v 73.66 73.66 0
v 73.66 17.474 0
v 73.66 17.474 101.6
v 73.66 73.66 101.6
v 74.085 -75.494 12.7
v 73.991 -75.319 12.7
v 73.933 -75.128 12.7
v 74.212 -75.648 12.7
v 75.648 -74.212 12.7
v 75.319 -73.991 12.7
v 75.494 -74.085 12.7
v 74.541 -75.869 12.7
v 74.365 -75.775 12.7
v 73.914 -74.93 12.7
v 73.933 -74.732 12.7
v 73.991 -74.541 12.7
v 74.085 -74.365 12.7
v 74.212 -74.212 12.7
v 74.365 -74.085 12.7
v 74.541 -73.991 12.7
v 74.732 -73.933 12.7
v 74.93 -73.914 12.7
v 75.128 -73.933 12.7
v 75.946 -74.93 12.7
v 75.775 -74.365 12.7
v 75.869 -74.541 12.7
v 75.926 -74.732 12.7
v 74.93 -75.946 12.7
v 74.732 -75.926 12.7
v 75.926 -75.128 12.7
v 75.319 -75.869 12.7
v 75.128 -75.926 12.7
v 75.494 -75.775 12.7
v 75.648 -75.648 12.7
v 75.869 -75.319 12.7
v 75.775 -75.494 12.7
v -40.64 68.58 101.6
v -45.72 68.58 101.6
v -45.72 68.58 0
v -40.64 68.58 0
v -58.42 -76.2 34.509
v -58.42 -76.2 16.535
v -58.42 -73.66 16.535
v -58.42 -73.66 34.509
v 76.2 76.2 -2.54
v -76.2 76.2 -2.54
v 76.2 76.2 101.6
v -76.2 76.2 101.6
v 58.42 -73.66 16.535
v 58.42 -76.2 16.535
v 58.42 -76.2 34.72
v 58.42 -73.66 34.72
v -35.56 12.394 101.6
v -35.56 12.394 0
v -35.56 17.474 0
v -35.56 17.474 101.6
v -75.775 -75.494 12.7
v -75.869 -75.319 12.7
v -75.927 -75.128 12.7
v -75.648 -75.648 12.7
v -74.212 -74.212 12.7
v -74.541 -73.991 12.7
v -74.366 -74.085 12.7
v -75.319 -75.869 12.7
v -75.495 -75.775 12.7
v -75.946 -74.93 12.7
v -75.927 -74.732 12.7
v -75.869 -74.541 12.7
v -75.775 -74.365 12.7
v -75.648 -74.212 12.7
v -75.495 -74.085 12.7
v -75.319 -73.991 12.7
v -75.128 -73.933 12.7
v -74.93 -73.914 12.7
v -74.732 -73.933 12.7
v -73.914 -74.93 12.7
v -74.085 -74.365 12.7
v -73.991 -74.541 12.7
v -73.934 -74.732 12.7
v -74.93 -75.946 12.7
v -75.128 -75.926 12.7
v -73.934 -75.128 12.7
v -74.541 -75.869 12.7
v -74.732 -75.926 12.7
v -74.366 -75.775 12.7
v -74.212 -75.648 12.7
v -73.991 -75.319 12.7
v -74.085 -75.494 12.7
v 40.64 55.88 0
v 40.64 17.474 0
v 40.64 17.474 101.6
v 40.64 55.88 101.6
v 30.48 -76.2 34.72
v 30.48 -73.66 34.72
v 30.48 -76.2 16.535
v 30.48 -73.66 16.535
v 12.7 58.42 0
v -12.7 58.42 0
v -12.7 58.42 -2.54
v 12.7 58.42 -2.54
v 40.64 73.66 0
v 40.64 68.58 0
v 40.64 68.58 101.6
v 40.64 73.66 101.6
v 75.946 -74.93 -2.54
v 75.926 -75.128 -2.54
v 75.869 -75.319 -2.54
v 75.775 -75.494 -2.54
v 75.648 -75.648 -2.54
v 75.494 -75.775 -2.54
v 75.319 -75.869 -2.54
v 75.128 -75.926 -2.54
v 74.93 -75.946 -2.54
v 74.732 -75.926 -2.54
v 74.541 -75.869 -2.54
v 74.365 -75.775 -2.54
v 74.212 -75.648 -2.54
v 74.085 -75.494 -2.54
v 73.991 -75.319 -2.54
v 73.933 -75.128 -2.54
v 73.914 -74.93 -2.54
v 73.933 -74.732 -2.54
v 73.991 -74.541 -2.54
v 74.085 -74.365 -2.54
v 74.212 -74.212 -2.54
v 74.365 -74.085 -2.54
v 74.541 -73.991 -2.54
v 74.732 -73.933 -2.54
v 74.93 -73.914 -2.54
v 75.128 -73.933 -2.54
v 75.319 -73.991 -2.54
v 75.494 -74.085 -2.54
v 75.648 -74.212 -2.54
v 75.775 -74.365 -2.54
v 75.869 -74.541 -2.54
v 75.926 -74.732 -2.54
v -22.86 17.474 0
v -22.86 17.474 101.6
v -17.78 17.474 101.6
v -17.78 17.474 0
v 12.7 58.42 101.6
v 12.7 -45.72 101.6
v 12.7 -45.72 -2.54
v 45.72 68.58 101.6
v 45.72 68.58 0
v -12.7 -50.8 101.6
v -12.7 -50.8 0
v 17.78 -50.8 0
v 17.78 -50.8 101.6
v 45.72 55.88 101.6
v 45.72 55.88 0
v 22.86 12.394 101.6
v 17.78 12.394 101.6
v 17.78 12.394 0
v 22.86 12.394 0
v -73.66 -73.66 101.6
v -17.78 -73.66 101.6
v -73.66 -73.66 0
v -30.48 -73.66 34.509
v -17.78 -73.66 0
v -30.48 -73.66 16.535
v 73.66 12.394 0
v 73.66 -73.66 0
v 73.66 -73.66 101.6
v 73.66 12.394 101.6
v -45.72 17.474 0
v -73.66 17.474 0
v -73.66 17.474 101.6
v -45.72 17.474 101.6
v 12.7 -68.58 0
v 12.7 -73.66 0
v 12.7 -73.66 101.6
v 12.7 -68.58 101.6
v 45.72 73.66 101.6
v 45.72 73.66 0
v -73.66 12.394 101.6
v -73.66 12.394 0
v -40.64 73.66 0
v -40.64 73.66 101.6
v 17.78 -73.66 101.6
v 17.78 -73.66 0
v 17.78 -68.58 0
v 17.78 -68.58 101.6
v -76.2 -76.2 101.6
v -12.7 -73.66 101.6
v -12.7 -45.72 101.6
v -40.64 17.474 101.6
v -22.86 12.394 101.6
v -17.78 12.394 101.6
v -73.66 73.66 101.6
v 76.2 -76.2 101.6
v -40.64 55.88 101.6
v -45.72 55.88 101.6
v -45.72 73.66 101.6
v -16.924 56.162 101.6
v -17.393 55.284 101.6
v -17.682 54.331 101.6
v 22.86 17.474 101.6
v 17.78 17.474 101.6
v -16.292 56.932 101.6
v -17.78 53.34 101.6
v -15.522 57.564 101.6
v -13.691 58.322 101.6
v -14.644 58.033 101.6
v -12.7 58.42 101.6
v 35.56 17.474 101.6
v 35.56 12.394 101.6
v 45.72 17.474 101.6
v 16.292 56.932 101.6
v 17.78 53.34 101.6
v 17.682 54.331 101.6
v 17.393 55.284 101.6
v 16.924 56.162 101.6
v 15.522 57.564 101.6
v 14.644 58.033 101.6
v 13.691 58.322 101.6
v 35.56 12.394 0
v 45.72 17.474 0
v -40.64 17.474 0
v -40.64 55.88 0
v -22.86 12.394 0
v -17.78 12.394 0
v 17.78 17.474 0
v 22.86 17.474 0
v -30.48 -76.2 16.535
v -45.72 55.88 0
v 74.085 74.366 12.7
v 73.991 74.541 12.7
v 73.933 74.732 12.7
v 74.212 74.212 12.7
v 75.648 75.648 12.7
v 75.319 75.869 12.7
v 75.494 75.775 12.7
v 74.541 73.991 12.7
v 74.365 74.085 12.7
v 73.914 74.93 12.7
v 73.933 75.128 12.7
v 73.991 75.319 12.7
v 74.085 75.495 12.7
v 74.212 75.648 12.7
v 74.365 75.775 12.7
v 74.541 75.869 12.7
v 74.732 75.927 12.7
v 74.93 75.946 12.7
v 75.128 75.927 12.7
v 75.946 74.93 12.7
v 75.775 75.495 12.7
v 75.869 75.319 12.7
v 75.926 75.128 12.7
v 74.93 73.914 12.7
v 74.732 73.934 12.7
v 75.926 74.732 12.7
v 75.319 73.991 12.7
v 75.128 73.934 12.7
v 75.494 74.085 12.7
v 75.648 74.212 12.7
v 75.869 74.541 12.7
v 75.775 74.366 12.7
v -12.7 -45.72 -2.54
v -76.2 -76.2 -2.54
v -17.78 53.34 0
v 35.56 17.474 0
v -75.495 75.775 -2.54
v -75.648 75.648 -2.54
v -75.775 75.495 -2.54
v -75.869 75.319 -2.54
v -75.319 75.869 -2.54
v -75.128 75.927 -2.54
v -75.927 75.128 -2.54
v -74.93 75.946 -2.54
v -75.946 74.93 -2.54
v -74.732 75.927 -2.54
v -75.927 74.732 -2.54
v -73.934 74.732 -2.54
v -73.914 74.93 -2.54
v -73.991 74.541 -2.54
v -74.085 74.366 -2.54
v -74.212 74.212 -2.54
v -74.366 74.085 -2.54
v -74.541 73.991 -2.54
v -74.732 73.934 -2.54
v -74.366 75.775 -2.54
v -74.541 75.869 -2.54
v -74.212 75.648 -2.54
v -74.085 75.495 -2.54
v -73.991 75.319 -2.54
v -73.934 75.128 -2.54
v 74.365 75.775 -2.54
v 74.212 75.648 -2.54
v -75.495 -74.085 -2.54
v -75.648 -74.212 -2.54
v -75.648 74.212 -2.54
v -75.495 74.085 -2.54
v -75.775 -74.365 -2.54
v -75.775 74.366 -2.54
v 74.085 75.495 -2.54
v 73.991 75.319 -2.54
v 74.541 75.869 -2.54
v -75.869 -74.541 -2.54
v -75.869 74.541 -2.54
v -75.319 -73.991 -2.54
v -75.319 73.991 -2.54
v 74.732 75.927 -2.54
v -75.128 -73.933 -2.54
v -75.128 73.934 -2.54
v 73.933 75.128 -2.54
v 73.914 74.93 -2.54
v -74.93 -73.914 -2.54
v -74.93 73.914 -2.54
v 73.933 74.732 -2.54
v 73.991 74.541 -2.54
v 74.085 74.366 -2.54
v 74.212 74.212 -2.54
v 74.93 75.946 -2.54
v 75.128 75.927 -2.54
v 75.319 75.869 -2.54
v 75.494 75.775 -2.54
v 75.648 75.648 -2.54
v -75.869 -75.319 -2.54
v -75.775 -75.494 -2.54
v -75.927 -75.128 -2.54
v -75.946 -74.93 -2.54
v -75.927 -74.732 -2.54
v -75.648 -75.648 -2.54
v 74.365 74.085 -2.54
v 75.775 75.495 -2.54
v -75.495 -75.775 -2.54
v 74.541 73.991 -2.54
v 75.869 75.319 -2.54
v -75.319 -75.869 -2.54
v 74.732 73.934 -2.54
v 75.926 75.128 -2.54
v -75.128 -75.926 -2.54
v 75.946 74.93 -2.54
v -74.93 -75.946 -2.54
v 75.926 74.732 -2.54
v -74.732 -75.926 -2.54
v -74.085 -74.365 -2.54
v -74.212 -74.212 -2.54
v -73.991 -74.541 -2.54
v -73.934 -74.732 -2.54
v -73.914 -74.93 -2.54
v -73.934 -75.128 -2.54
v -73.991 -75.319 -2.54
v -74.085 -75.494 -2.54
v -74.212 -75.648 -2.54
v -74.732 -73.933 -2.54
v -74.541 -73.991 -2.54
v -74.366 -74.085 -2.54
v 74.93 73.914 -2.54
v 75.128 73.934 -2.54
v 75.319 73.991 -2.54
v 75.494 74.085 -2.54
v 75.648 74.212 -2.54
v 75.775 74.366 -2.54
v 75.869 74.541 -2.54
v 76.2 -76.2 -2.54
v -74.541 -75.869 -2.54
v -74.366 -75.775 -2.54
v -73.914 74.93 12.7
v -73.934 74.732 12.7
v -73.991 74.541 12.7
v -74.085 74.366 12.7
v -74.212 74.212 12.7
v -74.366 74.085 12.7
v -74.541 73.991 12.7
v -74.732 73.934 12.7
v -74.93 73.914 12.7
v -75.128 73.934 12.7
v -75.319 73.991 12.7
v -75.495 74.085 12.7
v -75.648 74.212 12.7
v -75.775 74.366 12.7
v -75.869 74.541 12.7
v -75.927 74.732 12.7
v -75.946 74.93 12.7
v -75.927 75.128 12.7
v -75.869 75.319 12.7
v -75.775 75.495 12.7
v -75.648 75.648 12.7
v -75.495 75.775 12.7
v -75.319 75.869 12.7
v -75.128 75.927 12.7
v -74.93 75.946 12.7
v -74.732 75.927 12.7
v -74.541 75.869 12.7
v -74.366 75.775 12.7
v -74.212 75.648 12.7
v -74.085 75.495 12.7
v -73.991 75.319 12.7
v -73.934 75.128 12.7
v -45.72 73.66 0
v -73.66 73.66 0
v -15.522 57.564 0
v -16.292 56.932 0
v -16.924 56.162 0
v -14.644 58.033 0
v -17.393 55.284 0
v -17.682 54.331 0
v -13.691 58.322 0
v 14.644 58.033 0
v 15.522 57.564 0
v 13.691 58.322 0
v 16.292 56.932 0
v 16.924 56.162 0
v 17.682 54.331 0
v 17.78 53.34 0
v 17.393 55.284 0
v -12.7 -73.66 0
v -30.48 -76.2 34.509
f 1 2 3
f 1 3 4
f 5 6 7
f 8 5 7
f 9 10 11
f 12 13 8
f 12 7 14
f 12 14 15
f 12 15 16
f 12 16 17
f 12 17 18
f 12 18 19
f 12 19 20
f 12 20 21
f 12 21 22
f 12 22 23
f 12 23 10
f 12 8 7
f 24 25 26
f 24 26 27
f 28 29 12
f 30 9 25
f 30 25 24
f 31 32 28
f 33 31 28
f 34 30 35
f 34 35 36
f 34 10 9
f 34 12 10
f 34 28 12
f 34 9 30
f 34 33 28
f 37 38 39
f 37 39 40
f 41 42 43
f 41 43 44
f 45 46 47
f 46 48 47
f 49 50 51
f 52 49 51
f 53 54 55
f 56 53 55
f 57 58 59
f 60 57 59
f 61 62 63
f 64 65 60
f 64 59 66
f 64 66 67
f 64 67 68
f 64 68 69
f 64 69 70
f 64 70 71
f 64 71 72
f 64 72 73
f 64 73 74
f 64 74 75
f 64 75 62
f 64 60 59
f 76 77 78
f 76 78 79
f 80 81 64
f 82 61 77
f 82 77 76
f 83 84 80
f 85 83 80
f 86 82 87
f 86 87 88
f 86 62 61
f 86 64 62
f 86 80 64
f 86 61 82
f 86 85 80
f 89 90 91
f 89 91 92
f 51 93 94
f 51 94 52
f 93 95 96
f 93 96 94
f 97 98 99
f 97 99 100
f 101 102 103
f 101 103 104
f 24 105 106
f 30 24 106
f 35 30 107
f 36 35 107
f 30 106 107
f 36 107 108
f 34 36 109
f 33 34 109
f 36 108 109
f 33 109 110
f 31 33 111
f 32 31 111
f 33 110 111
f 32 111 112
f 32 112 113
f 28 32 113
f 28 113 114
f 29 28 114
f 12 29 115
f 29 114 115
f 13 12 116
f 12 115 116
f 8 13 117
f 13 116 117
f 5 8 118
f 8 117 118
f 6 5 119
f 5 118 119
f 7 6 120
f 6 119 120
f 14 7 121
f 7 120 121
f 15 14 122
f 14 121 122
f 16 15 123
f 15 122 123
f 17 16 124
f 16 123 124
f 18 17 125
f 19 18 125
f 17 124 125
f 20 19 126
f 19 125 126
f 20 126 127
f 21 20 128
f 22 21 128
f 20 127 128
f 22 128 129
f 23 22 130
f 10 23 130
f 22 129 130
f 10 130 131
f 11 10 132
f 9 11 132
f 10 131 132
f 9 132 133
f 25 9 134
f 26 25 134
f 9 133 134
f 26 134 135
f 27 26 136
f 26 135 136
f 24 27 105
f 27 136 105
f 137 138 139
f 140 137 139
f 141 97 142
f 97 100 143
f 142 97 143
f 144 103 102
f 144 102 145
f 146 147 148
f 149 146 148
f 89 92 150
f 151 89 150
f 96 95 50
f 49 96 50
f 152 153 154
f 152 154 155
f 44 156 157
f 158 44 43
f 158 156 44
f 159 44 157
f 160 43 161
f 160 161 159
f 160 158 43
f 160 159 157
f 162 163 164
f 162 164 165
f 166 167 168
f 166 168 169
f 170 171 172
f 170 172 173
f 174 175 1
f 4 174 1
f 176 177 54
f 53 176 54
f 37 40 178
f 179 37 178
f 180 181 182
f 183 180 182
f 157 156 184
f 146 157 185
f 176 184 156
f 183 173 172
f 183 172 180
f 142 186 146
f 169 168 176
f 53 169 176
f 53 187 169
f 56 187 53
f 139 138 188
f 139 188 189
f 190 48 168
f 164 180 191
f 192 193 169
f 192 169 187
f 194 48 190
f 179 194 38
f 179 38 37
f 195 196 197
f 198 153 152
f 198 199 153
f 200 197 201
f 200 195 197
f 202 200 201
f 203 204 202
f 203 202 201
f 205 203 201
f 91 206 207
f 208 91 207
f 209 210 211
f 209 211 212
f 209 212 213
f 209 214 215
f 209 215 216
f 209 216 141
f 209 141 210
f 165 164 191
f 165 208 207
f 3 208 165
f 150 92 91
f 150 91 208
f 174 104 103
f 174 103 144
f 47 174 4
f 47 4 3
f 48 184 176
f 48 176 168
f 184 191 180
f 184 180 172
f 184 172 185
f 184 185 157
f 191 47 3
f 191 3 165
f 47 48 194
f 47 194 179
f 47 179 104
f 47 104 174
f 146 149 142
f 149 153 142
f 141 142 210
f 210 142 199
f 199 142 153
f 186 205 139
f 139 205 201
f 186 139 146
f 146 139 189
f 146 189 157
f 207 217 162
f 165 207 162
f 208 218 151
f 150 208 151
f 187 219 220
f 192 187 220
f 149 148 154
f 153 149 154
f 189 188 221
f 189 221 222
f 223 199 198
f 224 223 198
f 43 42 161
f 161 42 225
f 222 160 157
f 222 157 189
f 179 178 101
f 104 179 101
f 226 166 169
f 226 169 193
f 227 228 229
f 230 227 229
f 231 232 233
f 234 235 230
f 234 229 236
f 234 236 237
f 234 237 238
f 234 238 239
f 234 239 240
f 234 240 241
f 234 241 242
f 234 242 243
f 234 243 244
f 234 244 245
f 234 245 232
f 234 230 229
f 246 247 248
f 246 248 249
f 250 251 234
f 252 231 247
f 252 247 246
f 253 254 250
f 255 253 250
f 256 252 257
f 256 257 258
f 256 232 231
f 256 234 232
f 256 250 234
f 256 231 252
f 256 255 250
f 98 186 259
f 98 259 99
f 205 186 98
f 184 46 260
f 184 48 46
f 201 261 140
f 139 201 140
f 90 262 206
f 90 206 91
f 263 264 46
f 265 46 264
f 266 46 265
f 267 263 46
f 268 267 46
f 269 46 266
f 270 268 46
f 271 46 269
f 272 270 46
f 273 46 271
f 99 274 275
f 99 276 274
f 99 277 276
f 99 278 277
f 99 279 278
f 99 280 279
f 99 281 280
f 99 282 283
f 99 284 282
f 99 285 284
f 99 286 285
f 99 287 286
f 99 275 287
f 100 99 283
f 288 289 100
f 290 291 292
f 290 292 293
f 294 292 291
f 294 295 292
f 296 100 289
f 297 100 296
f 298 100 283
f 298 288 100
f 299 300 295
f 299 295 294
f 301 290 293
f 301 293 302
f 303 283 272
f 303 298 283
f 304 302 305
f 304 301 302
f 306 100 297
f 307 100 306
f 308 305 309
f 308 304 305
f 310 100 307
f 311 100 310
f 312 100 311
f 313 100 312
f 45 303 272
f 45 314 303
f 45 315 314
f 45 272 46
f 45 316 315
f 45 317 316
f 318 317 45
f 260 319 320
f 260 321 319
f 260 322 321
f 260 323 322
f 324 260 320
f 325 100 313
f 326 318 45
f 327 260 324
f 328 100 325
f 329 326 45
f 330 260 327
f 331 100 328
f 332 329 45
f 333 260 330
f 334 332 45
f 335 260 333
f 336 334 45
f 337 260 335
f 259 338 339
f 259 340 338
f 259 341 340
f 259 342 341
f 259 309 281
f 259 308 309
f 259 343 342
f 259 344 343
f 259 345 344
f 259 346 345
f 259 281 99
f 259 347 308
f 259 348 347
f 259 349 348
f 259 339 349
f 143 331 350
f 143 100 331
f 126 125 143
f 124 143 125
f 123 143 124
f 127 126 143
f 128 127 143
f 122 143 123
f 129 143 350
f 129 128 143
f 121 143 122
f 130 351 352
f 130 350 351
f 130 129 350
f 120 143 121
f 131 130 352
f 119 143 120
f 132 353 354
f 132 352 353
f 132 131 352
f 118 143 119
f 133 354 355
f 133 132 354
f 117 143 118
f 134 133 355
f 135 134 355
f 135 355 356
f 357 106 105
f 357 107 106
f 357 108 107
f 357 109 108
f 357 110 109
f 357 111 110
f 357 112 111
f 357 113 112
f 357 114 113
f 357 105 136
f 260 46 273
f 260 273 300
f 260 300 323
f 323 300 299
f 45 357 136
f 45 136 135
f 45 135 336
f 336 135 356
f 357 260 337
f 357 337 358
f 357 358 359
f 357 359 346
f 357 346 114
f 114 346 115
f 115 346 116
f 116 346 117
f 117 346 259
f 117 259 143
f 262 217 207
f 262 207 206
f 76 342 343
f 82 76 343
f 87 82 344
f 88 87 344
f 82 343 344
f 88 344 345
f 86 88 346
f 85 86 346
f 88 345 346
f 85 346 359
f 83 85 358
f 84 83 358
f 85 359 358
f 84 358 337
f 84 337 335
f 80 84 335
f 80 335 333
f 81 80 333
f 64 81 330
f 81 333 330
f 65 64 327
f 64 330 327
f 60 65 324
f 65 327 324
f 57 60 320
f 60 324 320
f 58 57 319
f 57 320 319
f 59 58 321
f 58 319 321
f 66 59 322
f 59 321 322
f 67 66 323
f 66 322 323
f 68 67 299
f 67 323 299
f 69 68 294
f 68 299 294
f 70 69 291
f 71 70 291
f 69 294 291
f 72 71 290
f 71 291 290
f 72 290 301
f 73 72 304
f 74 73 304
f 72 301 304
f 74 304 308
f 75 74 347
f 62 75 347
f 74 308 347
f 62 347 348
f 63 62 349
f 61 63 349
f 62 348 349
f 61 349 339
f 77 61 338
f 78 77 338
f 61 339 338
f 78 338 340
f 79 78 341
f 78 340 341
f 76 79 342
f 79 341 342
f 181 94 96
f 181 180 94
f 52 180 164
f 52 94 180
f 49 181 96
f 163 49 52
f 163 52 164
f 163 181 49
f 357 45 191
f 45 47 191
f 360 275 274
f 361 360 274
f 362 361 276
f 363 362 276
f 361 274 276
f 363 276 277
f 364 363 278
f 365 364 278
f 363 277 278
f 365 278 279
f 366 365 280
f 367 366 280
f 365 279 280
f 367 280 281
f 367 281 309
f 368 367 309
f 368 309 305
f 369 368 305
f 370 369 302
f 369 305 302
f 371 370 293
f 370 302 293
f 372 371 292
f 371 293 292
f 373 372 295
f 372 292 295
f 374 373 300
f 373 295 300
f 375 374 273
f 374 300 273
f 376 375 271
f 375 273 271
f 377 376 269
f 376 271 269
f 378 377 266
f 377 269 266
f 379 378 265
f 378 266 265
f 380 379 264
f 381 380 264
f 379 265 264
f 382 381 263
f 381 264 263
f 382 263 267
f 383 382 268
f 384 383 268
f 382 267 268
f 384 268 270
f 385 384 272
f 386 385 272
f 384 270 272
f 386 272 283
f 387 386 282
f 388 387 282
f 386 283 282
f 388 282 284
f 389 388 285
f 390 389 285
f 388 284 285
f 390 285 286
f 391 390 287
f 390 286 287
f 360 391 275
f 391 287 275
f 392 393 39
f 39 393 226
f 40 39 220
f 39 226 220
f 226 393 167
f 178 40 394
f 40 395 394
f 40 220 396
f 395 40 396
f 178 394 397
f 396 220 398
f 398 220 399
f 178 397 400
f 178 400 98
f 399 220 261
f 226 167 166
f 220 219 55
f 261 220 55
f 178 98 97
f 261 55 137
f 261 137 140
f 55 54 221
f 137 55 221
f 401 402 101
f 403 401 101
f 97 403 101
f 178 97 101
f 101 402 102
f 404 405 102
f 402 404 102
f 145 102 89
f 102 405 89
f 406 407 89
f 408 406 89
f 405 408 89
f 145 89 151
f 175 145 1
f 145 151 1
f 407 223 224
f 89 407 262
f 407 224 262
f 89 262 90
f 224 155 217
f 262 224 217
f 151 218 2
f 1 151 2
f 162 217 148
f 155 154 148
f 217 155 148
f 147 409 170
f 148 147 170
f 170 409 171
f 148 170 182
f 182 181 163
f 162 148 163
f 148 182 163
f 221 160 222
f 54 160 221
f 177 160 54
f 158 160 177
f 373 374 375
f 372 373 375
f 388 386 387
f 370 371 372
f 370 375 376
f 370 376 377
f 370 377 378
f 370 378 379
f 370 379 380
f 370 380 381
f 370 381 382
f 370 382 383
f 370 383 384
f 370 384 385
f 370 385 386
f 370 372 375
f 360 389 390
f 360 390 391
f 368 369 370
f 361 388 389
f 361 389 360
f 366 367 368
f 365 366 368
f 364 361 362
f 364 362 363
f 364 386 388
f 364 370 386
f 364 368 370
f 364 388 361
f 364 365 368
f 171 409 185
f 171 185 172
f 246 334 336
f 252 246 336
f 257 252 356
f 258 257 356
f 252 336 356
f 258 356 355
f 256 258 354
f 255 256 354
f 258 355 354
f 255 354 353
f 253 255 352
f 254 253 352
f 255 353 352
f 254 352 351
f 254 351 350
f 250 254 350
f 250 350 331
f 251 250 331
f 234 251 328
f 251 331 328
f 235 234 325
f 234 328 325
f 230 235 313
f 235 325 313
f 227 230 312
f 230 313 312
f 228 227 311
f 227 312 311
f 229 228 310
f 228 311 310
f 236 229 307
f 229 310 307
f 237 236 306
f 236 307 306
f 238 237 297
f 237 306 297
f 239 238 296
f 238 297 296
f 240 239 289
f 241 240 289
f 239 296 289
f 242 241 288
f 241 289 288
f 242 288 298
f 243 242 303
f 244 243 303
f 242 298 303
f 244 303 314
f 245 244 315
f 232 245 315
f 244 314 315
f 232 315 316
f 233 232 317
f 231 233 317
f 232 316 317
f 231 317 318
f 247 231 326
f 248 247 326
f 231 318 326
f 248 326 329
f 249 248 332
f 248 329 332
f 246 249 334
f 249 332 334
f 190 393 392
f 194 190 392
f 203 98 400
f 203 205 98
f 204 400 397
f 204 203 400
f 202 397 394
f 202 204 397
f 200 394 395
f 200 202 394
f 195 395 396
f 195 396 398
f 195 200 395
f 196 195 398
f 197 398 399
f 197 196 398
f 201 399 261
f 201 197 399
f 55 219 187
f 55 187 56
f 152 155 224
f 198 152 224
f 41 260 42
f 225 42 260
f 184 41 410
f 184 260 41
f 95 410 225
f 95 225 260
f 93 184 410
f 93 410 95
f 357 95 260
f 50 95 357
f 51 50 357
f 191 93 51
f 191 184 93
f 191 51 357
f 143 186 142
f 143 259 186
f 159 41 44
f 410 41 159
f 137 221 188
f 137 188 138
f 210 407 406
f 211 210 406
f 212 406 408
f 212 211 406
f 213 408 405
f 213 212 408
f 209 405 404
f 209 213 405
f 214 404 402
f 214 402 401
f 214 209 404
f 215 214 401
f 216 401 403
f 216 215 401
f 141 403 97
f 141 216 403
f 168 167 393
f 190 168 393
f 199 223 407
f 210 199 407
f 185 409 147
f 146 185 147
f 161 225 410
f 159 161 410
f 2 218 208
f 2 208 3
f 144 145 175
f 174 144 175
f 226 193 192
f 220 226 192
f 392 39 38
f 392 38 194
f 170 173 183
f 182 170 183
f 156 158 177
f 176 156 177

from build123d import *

# Parameters (mm, degrees)
F0_W      = 152.4
F0_H      = 152.4
F0_W_2    = 147.32
F0_H_2    = 147.32
F1_DEPTH  = 101.6
F2_W      = 152.4
F2_H      = 152.4
F3_DEPTH  = 2.54
F4_W      = 27.94
F4_H      = 18.1844604351
F4_H_2    = 17.9737907264
F5_DEPTH  = 25.4
F7_DEPTH  = 101.6
F8_W      = 25.4
F8_H      = 5.08
F9_DEPTH  = 101.6
F10_W     = 25.4
F10_H     = 5.08
F11_DEPTH = 101.6
F12_W     = 5.08
F12_H     = 5.08
F13_DEPTH = 101.6
F14_W     = 38.1
F14_H     = 5.08
F15_DEPTH = 101.6
F16_W     = 5.08
F16_H     = 38.4063468442
F16_H_2   = 5.08
F17_DEPTH = 101.6
F18_W     = 25.4
F18_H     = 104.14
F19_DEPTH = 25.4
F20_R     = 5.07999
F21_W     = 5.08
F21_H     = 5.08
F21_W_2   = 38.1
F21_H_2   = 22.86
F22_DEPTH = 101.6
F23_R     = 1.016
F24_DEPTH = 15.24


# Not quite as in the source:
# - a fillet or chamfer is up to 0.001 mm smaller than in the source, because OpenCascade refuses the exact size


with BuildPart() as f1:
    # F0 (on Top) → F1 (new body)
    with BuildSketch(Plane.XY):
        with Locations((-4.47035e-05, 5.21541e-05)):
            Rectangle(F0_W, F0_H)
        with Locations((-4.47035e-05, 5.21541e-05)):
            Rectangle(F0_W_2, F0_H_2, mode=Mode.SUBTRACT)
    extrude(amount=F1_DEPTH)

    # F2 (on face) → F3 (join)
    with BuildSketch(Plane(origin=(0, 0, 0), x_dir=(1, 0, 0), z_dir=(0, 0, -1))):
        with Locations((-4.47035e-05, -5.21541e-05)):
            Rectangle(F2_W, F2_H)
    extrude(amount=F3_DEPTH)

    # F4 (on face) → F5 (cut)
    with BuildSketch(Plane.XZ.offset(76.1999478459)):
        with Locations((44.4499552965, 25.6276302175)):
            Rectangle(F4_W, F4_H)
        with Locations((-44.4500447035, 25.5222953632)):
            Rectangle(F4_W, F4_H_2)
    extrude(amount=-F5_DEPTH, mode=Mode.SUBTRACT)

    # F6 (on face) → F7 (join)
    with BuildSketch(Plane.XY):
        Polygon((-17.7800447035, 58.4200521541), (-17.7800447035, -50.7999478459), (-12.7000447035, -50.7999478459), (-12.7000447035, 53.3400521541), (12.6999552965, 53.3400521541), (12.6999552965, -50.7999478459), (17.7799552965, -50.7999478459), (17.7799552965, 44.5264838636), (17.7799552965, 58.4200521541), align=None)
    extrude(amount=F7_DEPTH)

    # F8 (on face) → F9 (join)
    with BuildSketch(Plane.XY):
        with Locations((-4.47035e-05, -48.2599478459)):
            Rectangle(F8_W, F8_H)
    extrude(amount=F9_DEPTH)

    # F10 (on face) → F11 (cut)
    with BuildSketch(Plane.XY.offset(101.6)):
        with Locations((-4.47035e-05, 55.8800521541)):
            Rectangle(F10_W, F10_H)
    extrude(amount=-F11_DEPTH, mode=Mode.SUBTRACT)

    # F12 (on face) → F13 (join)
    with BuildSketch(Plane.XY):
        with Locations((-20.3200447035, 14.9337053099)):
            Rectangle(F12_W, F12_H)
    extrude(amount=F13_DEPTH)

    # F14 (on face) → F15 (join)
    with BuildSketch(Plane.XY):
        with Locations((-54.6100447035, 14.9337053099)):
            Rectangle(F14_W, F14_H)
    extrude(amount=F15_DEPTH)

    # F16 (on face) → F17 (join)
    with BuildSketch(Plane.XY):
        with Locations((-43.1800447035, 36.676878732)):
            Rectangle(F16_W, F16_H)
        with Locations((-43.1800447035, 71.1200521541)):
            Rectangle(F16_W, F16_H_2)
        with Locations((43.1799552965, 71.1200521541)):
            Rectangle(F16_W, F16_H_2)
        with Locations((43.1799552965, 36.676878732)):
            Rectangle(F16_W, F16_H)
    extrude(amount=F17_DEPTH)

    # F18 (on face) → F19 (cut)
    with BuildSketch(Plane.XY):
        with Locations((-4.47035e-05, 6.3500521541)):
            Rectangle(F18_W, F18_H)
    extrude(amount=-F19_DEPTH, mode=Mode.SUBTRACT)

    # F20 (radius 5.08 in the source; OpenCascade refuses exactly that, so slightly less here)
    f20_edges = [f1.edges().sort_by_distance(p)[0] for p in [
        (-17.780045, 58.420052, 50.8),
        (17.779955, 58.420052, 50.8),
    ]]
    fillet(f20_edges, radius=F20_R)

    # F21 (on face) → F22 (join)
    with BuildSketch(Plane.XY):
        with Locations((20.3199552965, 14.9337053099)):
            Rectangle(F21_W, F21_H)
        with Locations((54.6099552965, 14.9337053099)):
            Rectangle(F21_W_2, F21_H)
        with Locations((-15.2400447035, -62.2299478459)):
            Rectangle(F21_W, F21_H_2)
        with Locations((15.2399552965, -71.1199478459)):
            Rectangle(F21_W, F21_H)
    extrude(amount=F22_DEPTH)

    # F23 (on face) → F24 (cut)
    with BuildSketch(Plane(origin=(0, 0, -2.54), x_dir=(1, 0, 0), z_dir=(0, 0, -1))):
        with Locations((-74.9300447035, 74.9299478459)):
            Circle(F23_R)
        with Locations((74.9299552965, 74.9299478459)):
            Circle(F23_R)
        with Locations((-74.9300447035, -74.9300521541)):
            Circle(F23_R)
        with Locations((74.9299552965, -74.9300521541)):
            Circle(F23_R)
    extrude(amount=-F24_DEPTH, mode=Mode.SUBTRACT)


solid = f1.part
